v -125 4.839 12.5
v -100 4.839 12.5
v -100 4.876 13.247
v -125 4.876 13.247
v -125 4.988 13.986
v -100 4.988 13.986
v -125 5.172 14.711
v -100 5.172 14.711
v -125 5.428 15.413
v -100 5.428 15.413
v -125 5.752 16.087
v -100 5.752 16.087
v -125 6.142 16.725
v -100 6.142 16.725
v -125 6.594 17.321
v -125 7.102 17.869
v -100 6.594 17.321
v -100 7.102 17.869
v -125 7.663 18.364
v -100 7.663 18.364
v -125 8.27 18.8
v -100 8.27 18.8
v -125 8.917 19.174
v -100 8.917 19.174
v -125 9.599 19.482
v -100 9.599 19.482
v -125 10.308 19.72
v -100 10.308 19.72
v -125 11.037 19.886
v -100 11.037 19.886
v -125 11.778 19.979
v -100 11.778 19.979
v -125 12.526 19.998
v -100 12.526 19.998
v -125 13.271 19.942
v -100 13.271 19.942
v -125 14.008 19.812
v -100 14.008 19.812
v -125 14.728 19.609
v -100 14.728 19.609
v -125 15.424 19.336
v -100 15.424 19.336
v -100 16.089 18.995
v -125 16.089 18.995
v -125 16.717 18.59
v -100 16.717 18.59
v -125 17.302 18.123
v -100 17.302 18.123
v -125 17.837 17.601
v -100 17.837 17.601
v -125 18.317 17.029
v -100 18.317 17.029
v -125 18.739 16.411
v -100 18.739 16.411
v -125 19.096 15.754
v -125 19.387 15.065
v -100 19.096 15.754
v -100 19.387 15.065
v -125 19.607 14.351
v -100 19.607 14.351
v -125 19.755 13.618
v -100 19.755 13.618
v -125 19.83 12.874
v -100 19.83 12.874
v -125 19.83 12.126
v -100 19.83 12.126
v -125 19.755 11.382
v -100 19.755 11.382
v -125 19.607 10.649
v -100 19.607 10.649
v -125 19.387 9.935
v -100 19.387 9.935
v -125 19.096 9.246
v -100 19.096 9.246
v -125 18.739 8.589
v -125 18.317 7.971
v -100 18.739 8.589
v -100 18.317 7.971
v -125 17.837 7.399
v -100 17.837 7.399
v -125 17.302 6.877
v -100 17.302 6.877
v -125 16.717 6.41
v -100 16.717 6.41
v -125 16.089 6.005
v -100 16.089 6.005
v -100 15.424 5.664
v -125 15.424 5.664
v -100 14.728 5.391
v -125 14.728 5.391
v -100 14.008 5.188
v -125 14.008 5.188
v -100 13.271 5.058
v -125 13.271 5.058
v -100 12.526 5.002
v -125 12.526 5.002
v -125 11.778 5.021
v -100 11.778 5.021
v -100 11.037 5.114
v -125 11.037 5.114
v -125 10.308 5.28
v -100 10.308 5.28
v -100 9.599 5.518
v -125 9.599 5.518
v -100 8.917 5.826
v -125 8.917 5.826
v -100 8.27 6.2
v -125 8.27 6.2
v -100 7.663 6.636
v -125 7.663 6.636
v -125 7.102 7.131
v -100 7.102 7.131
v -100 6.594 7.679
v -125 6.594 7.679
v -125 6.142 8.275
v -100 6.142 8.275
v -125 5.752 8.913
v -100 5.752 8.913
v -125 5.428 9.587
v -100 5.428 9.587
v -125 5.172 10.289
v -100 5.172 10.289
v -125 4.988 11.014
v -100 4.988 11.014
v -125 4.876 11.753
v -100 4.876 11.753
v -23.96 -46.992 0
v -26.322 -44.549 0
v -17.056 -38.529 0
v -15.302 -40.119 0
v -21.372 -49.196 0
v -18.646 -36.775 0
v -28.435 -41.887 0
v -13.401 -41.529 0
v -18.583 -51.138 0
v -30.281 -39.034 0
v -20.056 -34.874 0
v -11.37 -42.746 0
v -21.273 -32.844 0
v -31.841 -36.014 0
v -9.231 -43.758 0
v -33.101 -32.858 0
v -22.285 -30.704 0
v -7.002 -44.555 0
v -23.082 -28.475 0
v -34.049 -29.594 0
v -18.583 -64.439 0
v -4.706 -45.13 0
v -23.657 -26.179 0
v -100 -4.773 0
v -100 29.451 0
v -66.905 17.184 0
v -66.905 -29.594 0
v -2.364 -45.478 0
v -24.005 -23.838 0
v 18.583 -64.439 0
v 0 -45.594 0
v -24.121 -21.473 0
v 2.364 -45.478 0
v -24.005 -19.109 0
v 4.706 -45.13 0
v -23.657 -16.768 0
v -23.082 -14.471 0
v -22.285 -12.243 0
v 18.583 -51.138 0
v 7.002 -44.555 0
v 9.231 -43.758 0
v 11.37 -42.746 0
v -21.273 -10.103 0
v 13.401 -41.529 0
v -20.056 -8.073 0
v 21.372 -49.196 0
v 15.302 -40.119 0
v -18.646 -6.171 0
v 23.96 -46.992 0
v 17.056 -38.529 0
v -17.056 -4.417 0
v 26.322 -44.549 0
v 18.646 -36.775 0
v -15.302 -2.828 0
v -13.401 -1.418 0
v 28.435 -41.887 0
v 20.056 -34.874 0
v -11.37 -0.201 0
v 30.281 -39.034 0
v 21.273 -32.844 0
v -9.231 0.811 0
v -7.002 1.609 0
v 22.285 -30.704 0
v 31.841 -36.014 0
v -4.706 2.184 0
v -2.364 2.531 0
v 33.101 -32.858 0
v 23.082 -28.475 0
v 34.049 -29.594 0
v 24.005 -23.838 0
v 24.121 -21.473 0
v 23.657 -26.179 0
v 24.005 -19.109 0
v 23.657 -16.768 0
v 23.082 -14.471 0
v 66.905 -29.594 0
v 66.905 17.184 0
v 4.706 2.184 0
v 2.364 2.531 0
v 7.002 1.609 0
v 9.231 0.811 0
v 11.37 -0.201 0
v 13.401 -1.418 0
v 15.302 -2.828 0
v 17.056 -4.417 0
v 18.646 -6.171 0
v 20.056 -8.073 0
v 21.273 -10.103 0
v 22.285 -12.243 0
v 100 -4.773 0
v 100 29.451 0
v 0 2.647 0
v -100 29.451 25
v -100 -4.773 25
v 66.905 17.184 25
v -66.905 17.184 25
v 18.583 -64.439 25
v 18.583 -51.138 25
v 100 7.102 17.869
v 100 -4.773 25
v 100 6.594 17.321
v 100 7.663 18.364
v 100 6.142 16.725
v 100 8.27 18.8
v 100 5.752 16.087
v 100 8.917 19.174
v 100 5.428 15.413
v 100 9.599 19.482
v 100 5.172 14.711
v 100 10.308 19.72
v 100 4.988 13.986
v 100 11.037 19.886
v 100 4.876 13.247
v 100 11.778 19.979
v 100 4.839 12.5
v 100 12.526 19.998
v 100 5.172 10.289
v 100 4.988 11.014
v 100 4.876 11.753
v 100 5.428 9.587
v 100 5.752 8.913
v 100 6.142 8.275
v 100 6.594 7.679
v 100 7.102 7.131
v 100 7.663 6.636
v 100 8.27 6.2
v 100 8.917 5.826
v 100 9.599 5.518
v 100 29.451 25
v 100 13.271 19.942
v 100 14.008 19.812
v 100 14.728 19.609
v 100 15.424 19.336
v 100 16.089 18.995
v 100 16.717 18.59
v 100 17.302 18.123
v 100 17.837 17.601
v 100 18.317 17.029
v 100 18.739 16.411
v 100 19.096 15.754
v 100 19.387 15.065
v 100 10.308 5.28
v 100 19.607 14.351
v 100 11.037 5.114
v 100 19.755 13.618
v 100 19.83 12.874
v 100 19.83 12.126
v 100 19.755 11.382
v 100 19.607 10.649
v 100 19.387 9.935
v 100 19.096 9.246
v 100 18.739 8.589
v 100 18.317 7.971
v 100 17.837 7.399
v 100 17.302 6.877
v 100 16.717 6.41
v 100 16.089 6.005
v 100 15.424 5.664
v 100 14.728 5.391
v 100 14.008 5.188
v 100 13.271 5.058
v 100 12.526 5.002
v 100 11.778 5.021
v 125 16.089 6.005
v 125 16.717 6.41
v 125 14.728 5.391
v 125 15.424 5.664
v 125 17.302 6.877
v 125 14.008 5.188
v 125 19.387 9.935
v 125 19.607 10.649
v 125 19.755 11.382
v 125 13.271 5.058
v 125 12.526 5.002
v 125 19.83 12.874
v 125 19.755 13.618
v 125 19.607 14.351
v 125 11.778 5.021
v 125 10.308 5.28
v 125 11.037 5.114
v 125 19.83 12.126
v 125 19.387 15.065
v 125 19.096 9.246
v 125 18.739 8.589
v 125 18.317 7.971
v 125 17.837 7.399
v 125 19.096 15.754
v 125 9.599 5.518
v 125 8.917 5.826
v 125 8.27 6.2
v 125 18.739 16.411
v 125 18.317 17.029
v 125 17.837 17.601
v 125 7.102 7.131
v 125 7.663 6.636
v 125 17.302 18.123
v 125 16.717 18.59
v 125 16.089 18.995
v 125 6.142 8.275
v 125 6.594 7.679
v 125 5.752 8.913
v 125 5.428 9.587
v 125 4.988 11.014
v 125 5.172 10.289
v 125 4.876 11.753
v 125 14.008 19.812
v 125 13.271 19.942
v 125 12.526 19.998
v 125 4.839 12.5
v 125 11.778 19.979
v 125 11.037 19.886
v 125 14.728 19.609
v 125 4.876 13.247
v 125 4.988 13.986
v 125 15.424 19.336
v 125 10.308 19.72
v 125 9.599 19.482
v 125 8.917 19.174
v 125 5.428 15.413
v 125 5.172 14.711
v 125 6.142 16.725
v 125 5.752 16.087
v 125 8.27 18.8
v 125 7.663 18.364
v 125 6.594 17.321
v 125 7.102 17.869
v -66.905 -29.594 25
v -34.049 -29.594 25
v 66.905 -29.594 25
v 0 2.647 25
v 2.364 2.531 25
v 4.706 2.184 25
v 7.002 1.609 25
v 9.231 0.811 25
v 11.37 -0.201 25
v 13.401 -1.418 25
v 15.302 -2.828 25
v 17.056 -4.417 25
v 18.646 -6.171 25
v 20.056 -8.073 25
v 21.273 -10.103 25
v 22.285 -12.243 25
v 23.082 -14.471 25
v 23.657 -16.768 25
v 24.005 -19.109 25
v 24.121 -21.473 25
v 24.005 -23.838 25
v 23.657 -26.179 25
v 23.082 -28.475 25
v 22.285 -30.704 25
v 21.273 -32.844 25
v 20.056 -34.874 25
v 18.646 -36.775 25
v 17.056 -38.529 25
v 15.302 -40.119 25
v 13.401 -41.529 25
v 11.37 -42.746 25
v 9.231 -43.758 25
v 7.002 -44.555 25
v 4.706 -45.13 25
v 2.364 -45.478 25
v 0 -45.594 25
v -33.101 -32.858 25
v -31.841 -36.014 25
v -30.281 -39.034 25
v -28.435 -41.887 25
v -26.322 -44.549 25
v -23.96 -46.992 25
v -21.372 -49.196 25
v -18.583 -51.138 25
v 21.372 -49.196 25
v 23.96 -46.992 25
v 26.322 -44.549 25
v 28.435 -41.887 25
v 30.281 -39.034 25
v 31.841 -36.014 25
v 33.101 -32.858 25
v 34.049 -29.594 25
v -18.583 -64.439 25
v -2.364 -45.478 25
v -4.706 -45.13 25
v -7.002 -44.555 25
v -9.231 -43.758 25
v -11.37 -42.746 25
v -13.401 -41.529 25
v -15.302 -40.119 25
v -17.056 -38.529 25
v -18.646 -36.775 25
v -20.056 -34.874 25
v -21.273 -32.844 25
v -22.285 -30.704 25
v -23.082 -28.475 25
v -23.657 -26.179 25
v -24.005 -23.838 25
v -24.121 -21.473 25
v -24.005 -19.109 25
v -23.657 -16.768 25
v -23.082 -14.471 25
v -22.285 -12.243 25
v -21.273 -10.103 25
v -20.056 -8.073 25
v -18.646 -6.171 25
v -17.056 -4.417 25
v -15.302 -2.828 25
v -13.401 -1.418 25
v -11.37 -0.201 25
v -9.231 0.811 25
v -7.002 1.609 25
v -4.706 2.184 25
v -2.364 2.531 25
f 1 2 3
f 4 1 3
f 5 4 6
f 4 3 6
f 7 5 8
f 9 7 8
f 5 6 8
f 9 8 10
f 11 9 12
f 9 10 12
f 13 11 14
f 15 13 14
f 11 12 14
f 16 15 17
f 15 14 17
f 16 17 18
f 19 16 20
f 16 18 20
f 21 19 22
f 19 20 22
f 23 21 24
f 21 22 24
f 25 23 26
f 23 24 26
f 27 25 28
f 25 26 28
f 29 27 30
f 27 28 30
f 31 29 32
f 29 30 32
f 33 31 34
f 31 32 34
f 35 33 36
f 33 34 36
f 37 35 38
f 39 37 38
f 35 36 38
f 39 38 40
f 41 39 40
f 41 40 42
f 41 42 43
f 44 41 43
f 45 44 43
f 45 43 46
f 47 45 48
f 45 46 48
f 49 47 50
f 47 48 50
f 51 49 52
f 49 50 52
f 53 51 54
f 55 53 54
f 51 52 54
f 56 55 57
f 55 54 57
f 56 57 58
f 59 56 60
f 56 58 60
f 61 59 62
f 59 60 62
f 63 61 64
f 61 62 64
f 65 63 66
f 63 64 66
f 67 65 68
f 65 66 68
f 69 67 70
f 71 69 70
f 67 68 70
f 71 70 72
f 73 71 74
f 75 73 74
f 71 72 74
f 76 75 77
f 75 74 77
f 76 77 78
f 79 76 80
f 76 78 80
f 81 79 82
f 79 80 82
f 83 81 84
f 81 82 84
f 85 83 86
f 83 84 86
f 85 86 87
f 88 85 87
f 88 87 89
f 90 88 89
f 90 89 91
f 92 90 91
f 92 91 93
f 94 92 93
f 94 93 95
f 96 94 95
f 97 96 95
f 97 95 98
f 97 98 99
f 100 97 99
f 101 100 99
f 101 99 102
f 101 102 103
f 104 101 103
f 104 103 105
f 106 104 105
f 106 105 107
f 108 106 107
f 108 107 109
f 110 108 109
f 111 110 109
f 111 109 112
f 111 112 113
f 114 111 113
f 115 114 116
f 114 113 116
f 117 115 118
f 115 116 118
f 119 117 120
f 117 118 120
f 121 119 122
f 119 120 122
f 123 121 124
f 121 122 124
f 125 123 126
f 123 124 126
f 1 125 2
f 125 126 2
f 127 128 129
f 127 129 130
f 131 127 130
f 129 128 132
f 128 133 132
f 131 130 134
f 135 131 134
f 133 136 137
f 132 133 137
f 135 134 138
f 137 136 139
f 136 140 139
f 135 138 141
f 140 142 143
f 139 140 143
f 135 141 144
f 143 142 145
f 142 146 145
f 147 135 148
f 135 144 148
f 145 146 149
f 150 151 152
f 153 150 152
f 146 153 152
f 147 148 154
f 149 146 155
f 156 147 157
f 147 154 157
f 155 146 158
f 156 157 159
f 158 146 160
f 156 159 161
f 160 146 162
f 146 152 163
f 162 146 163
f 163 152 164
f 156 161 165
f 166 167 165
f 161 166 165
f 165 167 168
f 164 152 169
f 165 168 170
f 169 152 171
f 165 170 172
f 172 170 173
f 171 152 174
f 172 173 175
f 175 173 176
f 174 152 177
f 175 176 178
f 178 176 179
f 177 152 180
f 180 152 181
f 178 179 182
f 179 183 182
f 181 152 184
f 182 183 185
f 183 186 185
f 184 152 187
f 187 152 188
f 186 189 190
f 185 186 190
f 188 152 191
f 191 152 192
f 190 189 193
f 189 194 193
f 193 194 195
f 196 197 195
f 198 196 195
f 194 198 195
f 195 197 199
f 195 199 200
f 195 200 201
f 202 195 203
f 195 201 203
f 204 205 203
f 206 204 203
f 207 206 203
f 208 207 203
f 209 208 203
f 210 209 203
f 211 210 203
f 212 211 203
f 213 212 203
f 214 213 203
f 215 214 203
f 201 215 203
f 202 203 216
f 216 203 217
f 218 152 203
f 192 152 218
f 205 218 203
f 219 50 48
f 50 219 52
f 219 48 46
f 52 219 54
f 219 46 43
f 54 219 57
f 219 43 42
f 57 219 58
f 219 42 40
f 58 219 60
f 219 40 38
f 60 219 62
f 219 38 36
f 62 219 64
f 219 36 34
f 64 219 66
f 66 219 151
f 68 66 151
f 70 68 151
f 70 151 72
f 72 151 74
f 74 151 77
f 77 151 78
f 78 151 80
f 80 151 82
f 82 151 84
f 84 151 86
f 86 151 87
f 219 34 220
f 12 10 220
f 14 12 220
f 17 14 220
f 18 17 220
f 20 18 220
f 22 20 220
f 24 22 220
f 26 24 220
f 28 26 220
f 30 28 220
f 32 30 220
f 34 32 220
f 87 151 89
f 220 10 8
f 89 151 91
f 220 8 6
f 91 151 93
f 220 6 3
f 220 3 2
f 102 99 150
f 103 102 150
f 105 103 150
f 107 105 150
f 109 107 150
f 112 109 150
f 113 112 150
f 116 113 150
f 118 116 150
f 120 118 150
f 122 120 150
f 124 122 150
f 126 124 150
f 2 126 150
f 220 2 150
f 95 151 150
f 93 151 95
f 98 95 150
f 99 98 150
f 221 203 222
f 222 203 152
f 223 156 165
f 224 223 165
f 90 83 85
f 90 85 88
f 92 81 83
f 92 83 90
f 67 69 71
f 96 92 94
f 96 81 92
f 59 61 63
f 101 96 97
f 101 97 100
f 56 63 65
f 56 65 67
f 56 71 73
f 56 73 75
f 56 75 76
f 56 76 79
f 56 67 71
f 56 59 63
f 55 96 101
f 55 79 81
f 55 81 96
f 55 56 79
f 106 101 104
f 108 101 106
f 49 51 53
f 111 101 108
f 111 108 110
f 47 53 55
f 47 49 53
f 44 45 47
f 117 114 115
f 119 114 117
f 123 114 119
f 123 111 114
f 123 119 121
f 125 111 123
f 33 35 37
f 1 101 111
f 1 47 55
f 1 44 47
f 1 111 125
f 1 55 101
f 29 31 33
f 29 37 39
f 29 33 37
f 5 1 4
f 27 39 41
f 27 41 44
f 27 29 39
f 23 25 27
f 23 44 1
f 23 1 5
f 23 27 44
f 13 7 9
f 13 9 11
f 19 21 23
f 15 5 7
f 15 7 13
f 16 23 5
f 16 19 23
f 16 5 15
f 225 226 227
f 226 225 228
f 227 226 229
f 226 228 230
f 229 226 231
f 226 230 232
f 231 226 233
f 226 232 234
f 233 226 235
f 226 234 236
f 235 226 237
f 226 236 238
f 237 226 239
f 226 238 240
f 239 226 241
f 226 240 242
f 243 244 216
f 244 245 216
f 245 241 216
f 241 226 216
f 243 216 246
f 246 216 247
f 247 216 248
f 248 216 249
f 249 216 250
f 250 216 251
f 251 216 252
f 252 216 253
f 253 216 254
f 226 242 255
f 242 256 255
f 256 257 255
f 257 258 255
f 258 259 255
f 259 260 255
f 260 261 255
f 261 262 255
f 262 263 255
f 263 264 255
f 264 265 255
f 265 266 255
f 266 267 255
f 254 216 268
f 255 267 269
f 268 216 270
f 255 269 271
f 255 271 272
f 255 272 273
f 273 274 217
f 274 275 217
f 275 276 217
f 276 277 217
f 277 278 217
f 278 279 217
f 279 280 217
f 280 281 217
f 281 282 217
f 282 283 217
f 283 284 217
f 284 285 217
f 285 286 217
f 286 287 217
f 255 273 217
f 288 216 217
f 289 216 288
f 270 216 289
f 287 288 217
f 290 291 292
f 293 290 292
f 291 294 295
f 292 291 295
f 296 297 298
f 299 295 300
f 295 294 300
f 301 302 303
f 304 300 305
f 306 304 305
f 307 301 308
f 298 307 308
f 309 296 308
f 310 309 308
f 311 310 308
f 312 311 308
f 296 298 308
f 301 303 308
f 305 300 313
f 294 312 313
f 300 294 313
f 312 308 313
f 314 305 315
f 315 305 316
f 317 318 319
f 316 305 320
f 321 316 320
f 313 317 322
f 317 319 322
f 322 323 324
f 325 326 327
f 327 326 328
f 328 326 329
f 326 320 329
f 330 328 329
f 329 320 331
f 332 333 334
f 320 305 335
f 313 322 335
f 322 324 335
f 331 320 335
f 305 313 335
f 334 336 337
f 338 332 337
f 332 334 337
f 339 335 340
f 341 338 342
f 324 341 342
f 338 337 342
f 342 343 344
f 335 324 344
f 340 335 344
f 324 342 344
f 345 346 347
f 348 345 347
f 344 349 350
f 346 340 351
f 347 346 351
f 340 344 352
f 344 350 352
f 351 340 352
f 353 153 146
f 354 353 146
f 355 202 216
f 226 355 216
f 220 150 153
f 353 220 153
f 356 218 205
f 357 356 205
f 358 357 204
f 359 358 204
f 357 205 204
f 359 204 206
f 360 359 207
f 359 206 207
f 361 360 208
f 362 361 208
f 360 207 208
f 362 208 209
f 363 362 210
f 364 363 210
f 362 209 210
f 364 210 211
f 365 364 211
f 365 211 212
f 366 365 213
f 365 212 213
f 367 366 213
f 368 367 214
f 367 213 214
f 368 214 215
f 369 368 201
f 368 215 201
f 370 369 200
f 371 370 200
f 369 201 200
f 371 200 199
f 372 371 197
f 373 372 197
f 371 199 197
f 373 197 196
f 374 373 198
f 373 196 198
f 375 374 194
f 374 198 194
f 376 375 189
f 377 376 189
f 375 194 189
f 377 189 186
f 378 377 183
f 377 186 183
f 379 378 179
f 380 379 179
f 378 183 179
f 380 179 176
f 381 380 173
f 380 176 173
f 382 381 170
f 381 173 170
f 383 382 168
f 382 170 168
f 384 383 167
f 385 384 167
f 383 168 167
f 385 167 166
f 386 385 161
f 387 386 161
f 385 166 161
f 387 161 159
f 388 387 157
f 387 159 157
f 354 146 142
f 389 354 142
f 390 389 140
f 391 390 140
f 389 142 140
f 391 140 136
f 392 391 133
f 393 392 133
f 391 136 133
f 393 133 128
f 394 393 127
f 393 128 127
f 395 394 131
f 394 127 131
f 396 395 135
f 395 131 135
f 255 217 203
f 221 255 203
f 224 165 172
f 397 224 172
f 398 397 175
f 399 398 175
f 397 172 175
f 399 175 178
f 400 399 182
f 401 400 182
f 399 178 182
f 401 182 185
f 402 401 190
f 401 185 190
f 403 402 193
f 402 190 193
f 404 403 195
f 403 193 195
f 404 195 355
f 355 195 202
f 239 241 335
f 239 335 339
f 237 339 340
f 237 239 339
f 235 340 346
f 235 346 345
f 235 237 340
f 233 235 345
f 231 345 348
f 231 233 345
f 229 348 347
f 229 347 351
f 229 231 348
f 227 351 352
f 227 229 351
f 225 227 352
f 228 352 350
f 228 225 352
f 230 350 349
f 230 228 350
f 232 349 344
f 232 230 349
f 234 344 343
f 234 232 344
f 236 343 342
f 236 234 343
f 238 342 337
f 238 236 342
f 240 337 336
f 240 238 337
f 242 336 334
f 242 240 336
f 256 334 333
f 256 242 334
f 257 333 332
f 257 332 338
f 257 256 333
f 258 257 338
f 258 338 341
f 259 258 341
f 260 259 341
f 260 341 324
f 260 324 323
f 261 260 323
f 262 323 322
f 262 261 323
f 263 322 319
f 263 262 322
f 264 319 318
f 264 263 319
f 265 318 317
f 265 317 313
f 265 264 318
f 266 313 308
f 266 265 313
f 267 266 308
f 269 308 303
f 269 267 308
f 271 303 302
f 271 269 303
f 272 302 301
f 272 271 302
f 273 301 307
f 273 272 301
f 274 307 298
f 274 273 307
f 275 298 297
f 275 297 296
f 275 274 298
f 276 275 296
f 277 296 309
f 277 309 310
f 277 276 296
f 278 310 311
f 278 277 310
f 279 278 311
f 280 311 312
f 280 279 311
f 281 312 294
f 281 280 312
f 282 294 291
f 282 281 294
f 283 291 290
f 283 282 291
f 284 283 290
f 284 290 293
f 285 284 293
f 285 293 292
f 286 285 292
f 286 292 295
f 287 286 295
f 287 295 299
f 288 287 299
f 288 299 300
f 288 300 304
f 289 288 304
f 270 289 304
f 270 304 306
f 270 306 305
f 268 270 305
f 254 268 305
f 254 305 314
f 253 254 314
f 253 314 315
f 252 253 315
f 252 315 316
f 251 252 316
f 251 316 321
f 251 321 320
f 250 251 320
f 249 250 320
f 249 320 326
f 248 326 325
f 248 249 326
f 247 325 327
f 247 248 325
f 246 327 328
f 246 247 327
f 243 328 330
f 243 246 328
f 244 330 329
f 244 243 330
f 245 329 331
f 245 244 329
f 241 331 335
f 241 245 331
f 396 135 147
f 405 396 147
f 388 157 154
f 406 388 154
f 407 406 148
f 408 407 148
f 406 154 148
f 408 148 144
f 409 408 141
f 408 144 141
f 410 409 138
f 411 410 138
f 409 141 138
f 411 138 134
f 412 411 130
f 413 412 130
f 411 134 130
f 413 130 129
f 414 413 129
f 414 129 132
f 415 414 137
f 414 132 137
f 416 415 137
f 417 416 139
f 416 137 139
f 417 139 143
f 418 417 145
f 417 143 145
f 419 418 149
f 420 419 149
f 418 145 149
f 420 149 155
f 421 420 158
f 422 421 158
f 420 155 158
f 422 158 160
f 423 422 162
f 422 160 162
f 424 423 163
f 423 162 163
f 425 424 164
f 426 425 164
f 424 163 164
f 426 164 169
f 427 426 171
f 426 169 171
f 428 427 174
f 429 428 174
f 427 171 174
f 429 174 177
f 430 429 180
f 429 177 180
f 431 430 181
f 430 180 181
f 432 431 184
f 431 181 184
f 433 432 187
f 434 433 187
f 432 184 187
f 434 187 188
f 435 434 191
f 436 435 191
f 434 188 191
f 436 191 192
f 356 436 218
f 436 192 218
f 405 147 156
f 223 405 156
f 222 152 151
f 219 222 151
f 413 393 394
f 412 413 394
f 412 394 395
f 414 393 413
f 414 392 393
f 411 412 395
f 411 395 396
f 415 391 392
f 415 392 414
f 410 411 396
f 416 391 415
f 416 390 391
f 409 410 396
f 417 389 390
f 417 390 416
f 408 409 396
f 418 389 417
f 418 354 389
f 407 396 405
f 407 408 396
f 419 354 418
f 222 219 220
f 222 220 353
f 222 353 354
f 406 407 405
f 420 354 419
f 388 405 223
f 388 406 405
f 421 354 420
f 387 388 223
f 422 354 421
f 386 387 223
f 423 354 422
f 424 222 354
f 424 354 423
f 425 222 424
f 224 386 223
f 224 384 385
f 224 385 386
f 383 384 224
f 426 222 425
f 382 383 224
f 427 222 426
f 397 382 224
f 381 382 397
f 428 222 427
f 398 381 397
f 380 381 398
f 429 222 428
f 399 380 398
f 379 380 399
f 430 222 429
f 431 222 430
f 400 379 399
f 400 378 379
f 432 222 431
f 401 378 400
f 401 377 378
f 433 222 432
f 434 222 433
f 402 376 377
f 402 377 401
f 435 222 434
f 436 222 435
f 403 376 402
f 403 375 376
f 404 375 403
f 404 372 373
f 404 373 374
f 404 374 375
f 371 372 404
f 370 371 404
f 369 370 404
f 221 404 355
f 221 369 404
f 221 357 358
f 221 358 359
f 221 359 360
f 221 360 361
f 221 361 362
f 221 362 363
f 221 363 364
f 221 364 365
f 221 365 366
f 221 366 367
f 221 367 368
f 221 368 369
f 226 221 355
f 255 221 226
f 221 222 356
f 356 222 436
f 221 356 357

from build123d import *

# Parameters (mm, degrees)
F1_DEPTH = 25
F2_R     = 7.5
F3_DEPTH = 25


with BuildPart() as f1:
    # F0 (on Top) → F1 (new body)
    with BuildSketch(Plane.XY):
        with BuildLine():
            Line((-18.5831710696, -64.4391401045), (0, -64.4391401045))
            Line((0, -64.4391401045), (18.5831710696, -64.4391401045))
            Line((18.5831710696, -64.4391401045), (18.5831710696, -51.1375991389))
            ThreePointArc((18.5831710696, -51.1375991389), (28.4354251443, -41.8873150264), (34.0493159096, -29.594272401))
            Line((34.0493159096, -29.594272401), (66.9053312008, -29.594272401))
            Line((66.9053312008, -29.594272401), (100, -4.7732681821))
            Line((100, -4.7732681821), (100, 29.4510790908))
            Line((100, 29.4510790908), (66.9053312008, 17.1837710472))
            Line((66.9053312008, 17.1837710472), (0, 17.1837710472))
            Line((0, 17.1837710472), (-66.9053312008, 17.1837710472))
            Line((-66.9053312008, 17.1837710472), (-100, 29.4510790908))
            Line((-100, 29.4510790908), (-100, -4.7732681821))
            Line((-100, -4.7732681821), (-66.9053312008, -29.594272401))
            Line((-66.9053312008, -29.594272401), (-34.0493159096, -29.594272401))
            ThreePointArc((-34.0493159096, -29.594272401), (-28.4354251443, -41.8873150264), (-18.5831710696, -51.1375991389))
            Line((-18.5831710696, -51.1375991389), (-18.5831710696, -64.4391401045))
        make_face()
        with BuildLine():
            ThreePointArc((0, 2.6473924518), (24.120664224, -21.4732717723), (0, -45.5939359963))
            ThreePointArc((0, -45.5939359963), (-24.120664224, -21.4732717723), (0, 2.6473924518))
        make_face(mode=Mode.SUBTRACT)
    extrude(amount=F1_DEPTH)

    # F2 (on face) → F3 (join)
    with BuildSketch(Plane(origin=(-100, 0, 0), x_dir=(0, -1, 0), z_dir=(-1, 0, 0))):
        with Locations((-12.3389054544, 12.5)):
            Circle(F2_R)
    extrude(amount=F3_DEPTH)

    # F4: F1 across plane


with BuildPart() as f1_1:
    add(f1.part)
    add(f1.part.mirror(Plane.YZ))


solid = f1_1.part
